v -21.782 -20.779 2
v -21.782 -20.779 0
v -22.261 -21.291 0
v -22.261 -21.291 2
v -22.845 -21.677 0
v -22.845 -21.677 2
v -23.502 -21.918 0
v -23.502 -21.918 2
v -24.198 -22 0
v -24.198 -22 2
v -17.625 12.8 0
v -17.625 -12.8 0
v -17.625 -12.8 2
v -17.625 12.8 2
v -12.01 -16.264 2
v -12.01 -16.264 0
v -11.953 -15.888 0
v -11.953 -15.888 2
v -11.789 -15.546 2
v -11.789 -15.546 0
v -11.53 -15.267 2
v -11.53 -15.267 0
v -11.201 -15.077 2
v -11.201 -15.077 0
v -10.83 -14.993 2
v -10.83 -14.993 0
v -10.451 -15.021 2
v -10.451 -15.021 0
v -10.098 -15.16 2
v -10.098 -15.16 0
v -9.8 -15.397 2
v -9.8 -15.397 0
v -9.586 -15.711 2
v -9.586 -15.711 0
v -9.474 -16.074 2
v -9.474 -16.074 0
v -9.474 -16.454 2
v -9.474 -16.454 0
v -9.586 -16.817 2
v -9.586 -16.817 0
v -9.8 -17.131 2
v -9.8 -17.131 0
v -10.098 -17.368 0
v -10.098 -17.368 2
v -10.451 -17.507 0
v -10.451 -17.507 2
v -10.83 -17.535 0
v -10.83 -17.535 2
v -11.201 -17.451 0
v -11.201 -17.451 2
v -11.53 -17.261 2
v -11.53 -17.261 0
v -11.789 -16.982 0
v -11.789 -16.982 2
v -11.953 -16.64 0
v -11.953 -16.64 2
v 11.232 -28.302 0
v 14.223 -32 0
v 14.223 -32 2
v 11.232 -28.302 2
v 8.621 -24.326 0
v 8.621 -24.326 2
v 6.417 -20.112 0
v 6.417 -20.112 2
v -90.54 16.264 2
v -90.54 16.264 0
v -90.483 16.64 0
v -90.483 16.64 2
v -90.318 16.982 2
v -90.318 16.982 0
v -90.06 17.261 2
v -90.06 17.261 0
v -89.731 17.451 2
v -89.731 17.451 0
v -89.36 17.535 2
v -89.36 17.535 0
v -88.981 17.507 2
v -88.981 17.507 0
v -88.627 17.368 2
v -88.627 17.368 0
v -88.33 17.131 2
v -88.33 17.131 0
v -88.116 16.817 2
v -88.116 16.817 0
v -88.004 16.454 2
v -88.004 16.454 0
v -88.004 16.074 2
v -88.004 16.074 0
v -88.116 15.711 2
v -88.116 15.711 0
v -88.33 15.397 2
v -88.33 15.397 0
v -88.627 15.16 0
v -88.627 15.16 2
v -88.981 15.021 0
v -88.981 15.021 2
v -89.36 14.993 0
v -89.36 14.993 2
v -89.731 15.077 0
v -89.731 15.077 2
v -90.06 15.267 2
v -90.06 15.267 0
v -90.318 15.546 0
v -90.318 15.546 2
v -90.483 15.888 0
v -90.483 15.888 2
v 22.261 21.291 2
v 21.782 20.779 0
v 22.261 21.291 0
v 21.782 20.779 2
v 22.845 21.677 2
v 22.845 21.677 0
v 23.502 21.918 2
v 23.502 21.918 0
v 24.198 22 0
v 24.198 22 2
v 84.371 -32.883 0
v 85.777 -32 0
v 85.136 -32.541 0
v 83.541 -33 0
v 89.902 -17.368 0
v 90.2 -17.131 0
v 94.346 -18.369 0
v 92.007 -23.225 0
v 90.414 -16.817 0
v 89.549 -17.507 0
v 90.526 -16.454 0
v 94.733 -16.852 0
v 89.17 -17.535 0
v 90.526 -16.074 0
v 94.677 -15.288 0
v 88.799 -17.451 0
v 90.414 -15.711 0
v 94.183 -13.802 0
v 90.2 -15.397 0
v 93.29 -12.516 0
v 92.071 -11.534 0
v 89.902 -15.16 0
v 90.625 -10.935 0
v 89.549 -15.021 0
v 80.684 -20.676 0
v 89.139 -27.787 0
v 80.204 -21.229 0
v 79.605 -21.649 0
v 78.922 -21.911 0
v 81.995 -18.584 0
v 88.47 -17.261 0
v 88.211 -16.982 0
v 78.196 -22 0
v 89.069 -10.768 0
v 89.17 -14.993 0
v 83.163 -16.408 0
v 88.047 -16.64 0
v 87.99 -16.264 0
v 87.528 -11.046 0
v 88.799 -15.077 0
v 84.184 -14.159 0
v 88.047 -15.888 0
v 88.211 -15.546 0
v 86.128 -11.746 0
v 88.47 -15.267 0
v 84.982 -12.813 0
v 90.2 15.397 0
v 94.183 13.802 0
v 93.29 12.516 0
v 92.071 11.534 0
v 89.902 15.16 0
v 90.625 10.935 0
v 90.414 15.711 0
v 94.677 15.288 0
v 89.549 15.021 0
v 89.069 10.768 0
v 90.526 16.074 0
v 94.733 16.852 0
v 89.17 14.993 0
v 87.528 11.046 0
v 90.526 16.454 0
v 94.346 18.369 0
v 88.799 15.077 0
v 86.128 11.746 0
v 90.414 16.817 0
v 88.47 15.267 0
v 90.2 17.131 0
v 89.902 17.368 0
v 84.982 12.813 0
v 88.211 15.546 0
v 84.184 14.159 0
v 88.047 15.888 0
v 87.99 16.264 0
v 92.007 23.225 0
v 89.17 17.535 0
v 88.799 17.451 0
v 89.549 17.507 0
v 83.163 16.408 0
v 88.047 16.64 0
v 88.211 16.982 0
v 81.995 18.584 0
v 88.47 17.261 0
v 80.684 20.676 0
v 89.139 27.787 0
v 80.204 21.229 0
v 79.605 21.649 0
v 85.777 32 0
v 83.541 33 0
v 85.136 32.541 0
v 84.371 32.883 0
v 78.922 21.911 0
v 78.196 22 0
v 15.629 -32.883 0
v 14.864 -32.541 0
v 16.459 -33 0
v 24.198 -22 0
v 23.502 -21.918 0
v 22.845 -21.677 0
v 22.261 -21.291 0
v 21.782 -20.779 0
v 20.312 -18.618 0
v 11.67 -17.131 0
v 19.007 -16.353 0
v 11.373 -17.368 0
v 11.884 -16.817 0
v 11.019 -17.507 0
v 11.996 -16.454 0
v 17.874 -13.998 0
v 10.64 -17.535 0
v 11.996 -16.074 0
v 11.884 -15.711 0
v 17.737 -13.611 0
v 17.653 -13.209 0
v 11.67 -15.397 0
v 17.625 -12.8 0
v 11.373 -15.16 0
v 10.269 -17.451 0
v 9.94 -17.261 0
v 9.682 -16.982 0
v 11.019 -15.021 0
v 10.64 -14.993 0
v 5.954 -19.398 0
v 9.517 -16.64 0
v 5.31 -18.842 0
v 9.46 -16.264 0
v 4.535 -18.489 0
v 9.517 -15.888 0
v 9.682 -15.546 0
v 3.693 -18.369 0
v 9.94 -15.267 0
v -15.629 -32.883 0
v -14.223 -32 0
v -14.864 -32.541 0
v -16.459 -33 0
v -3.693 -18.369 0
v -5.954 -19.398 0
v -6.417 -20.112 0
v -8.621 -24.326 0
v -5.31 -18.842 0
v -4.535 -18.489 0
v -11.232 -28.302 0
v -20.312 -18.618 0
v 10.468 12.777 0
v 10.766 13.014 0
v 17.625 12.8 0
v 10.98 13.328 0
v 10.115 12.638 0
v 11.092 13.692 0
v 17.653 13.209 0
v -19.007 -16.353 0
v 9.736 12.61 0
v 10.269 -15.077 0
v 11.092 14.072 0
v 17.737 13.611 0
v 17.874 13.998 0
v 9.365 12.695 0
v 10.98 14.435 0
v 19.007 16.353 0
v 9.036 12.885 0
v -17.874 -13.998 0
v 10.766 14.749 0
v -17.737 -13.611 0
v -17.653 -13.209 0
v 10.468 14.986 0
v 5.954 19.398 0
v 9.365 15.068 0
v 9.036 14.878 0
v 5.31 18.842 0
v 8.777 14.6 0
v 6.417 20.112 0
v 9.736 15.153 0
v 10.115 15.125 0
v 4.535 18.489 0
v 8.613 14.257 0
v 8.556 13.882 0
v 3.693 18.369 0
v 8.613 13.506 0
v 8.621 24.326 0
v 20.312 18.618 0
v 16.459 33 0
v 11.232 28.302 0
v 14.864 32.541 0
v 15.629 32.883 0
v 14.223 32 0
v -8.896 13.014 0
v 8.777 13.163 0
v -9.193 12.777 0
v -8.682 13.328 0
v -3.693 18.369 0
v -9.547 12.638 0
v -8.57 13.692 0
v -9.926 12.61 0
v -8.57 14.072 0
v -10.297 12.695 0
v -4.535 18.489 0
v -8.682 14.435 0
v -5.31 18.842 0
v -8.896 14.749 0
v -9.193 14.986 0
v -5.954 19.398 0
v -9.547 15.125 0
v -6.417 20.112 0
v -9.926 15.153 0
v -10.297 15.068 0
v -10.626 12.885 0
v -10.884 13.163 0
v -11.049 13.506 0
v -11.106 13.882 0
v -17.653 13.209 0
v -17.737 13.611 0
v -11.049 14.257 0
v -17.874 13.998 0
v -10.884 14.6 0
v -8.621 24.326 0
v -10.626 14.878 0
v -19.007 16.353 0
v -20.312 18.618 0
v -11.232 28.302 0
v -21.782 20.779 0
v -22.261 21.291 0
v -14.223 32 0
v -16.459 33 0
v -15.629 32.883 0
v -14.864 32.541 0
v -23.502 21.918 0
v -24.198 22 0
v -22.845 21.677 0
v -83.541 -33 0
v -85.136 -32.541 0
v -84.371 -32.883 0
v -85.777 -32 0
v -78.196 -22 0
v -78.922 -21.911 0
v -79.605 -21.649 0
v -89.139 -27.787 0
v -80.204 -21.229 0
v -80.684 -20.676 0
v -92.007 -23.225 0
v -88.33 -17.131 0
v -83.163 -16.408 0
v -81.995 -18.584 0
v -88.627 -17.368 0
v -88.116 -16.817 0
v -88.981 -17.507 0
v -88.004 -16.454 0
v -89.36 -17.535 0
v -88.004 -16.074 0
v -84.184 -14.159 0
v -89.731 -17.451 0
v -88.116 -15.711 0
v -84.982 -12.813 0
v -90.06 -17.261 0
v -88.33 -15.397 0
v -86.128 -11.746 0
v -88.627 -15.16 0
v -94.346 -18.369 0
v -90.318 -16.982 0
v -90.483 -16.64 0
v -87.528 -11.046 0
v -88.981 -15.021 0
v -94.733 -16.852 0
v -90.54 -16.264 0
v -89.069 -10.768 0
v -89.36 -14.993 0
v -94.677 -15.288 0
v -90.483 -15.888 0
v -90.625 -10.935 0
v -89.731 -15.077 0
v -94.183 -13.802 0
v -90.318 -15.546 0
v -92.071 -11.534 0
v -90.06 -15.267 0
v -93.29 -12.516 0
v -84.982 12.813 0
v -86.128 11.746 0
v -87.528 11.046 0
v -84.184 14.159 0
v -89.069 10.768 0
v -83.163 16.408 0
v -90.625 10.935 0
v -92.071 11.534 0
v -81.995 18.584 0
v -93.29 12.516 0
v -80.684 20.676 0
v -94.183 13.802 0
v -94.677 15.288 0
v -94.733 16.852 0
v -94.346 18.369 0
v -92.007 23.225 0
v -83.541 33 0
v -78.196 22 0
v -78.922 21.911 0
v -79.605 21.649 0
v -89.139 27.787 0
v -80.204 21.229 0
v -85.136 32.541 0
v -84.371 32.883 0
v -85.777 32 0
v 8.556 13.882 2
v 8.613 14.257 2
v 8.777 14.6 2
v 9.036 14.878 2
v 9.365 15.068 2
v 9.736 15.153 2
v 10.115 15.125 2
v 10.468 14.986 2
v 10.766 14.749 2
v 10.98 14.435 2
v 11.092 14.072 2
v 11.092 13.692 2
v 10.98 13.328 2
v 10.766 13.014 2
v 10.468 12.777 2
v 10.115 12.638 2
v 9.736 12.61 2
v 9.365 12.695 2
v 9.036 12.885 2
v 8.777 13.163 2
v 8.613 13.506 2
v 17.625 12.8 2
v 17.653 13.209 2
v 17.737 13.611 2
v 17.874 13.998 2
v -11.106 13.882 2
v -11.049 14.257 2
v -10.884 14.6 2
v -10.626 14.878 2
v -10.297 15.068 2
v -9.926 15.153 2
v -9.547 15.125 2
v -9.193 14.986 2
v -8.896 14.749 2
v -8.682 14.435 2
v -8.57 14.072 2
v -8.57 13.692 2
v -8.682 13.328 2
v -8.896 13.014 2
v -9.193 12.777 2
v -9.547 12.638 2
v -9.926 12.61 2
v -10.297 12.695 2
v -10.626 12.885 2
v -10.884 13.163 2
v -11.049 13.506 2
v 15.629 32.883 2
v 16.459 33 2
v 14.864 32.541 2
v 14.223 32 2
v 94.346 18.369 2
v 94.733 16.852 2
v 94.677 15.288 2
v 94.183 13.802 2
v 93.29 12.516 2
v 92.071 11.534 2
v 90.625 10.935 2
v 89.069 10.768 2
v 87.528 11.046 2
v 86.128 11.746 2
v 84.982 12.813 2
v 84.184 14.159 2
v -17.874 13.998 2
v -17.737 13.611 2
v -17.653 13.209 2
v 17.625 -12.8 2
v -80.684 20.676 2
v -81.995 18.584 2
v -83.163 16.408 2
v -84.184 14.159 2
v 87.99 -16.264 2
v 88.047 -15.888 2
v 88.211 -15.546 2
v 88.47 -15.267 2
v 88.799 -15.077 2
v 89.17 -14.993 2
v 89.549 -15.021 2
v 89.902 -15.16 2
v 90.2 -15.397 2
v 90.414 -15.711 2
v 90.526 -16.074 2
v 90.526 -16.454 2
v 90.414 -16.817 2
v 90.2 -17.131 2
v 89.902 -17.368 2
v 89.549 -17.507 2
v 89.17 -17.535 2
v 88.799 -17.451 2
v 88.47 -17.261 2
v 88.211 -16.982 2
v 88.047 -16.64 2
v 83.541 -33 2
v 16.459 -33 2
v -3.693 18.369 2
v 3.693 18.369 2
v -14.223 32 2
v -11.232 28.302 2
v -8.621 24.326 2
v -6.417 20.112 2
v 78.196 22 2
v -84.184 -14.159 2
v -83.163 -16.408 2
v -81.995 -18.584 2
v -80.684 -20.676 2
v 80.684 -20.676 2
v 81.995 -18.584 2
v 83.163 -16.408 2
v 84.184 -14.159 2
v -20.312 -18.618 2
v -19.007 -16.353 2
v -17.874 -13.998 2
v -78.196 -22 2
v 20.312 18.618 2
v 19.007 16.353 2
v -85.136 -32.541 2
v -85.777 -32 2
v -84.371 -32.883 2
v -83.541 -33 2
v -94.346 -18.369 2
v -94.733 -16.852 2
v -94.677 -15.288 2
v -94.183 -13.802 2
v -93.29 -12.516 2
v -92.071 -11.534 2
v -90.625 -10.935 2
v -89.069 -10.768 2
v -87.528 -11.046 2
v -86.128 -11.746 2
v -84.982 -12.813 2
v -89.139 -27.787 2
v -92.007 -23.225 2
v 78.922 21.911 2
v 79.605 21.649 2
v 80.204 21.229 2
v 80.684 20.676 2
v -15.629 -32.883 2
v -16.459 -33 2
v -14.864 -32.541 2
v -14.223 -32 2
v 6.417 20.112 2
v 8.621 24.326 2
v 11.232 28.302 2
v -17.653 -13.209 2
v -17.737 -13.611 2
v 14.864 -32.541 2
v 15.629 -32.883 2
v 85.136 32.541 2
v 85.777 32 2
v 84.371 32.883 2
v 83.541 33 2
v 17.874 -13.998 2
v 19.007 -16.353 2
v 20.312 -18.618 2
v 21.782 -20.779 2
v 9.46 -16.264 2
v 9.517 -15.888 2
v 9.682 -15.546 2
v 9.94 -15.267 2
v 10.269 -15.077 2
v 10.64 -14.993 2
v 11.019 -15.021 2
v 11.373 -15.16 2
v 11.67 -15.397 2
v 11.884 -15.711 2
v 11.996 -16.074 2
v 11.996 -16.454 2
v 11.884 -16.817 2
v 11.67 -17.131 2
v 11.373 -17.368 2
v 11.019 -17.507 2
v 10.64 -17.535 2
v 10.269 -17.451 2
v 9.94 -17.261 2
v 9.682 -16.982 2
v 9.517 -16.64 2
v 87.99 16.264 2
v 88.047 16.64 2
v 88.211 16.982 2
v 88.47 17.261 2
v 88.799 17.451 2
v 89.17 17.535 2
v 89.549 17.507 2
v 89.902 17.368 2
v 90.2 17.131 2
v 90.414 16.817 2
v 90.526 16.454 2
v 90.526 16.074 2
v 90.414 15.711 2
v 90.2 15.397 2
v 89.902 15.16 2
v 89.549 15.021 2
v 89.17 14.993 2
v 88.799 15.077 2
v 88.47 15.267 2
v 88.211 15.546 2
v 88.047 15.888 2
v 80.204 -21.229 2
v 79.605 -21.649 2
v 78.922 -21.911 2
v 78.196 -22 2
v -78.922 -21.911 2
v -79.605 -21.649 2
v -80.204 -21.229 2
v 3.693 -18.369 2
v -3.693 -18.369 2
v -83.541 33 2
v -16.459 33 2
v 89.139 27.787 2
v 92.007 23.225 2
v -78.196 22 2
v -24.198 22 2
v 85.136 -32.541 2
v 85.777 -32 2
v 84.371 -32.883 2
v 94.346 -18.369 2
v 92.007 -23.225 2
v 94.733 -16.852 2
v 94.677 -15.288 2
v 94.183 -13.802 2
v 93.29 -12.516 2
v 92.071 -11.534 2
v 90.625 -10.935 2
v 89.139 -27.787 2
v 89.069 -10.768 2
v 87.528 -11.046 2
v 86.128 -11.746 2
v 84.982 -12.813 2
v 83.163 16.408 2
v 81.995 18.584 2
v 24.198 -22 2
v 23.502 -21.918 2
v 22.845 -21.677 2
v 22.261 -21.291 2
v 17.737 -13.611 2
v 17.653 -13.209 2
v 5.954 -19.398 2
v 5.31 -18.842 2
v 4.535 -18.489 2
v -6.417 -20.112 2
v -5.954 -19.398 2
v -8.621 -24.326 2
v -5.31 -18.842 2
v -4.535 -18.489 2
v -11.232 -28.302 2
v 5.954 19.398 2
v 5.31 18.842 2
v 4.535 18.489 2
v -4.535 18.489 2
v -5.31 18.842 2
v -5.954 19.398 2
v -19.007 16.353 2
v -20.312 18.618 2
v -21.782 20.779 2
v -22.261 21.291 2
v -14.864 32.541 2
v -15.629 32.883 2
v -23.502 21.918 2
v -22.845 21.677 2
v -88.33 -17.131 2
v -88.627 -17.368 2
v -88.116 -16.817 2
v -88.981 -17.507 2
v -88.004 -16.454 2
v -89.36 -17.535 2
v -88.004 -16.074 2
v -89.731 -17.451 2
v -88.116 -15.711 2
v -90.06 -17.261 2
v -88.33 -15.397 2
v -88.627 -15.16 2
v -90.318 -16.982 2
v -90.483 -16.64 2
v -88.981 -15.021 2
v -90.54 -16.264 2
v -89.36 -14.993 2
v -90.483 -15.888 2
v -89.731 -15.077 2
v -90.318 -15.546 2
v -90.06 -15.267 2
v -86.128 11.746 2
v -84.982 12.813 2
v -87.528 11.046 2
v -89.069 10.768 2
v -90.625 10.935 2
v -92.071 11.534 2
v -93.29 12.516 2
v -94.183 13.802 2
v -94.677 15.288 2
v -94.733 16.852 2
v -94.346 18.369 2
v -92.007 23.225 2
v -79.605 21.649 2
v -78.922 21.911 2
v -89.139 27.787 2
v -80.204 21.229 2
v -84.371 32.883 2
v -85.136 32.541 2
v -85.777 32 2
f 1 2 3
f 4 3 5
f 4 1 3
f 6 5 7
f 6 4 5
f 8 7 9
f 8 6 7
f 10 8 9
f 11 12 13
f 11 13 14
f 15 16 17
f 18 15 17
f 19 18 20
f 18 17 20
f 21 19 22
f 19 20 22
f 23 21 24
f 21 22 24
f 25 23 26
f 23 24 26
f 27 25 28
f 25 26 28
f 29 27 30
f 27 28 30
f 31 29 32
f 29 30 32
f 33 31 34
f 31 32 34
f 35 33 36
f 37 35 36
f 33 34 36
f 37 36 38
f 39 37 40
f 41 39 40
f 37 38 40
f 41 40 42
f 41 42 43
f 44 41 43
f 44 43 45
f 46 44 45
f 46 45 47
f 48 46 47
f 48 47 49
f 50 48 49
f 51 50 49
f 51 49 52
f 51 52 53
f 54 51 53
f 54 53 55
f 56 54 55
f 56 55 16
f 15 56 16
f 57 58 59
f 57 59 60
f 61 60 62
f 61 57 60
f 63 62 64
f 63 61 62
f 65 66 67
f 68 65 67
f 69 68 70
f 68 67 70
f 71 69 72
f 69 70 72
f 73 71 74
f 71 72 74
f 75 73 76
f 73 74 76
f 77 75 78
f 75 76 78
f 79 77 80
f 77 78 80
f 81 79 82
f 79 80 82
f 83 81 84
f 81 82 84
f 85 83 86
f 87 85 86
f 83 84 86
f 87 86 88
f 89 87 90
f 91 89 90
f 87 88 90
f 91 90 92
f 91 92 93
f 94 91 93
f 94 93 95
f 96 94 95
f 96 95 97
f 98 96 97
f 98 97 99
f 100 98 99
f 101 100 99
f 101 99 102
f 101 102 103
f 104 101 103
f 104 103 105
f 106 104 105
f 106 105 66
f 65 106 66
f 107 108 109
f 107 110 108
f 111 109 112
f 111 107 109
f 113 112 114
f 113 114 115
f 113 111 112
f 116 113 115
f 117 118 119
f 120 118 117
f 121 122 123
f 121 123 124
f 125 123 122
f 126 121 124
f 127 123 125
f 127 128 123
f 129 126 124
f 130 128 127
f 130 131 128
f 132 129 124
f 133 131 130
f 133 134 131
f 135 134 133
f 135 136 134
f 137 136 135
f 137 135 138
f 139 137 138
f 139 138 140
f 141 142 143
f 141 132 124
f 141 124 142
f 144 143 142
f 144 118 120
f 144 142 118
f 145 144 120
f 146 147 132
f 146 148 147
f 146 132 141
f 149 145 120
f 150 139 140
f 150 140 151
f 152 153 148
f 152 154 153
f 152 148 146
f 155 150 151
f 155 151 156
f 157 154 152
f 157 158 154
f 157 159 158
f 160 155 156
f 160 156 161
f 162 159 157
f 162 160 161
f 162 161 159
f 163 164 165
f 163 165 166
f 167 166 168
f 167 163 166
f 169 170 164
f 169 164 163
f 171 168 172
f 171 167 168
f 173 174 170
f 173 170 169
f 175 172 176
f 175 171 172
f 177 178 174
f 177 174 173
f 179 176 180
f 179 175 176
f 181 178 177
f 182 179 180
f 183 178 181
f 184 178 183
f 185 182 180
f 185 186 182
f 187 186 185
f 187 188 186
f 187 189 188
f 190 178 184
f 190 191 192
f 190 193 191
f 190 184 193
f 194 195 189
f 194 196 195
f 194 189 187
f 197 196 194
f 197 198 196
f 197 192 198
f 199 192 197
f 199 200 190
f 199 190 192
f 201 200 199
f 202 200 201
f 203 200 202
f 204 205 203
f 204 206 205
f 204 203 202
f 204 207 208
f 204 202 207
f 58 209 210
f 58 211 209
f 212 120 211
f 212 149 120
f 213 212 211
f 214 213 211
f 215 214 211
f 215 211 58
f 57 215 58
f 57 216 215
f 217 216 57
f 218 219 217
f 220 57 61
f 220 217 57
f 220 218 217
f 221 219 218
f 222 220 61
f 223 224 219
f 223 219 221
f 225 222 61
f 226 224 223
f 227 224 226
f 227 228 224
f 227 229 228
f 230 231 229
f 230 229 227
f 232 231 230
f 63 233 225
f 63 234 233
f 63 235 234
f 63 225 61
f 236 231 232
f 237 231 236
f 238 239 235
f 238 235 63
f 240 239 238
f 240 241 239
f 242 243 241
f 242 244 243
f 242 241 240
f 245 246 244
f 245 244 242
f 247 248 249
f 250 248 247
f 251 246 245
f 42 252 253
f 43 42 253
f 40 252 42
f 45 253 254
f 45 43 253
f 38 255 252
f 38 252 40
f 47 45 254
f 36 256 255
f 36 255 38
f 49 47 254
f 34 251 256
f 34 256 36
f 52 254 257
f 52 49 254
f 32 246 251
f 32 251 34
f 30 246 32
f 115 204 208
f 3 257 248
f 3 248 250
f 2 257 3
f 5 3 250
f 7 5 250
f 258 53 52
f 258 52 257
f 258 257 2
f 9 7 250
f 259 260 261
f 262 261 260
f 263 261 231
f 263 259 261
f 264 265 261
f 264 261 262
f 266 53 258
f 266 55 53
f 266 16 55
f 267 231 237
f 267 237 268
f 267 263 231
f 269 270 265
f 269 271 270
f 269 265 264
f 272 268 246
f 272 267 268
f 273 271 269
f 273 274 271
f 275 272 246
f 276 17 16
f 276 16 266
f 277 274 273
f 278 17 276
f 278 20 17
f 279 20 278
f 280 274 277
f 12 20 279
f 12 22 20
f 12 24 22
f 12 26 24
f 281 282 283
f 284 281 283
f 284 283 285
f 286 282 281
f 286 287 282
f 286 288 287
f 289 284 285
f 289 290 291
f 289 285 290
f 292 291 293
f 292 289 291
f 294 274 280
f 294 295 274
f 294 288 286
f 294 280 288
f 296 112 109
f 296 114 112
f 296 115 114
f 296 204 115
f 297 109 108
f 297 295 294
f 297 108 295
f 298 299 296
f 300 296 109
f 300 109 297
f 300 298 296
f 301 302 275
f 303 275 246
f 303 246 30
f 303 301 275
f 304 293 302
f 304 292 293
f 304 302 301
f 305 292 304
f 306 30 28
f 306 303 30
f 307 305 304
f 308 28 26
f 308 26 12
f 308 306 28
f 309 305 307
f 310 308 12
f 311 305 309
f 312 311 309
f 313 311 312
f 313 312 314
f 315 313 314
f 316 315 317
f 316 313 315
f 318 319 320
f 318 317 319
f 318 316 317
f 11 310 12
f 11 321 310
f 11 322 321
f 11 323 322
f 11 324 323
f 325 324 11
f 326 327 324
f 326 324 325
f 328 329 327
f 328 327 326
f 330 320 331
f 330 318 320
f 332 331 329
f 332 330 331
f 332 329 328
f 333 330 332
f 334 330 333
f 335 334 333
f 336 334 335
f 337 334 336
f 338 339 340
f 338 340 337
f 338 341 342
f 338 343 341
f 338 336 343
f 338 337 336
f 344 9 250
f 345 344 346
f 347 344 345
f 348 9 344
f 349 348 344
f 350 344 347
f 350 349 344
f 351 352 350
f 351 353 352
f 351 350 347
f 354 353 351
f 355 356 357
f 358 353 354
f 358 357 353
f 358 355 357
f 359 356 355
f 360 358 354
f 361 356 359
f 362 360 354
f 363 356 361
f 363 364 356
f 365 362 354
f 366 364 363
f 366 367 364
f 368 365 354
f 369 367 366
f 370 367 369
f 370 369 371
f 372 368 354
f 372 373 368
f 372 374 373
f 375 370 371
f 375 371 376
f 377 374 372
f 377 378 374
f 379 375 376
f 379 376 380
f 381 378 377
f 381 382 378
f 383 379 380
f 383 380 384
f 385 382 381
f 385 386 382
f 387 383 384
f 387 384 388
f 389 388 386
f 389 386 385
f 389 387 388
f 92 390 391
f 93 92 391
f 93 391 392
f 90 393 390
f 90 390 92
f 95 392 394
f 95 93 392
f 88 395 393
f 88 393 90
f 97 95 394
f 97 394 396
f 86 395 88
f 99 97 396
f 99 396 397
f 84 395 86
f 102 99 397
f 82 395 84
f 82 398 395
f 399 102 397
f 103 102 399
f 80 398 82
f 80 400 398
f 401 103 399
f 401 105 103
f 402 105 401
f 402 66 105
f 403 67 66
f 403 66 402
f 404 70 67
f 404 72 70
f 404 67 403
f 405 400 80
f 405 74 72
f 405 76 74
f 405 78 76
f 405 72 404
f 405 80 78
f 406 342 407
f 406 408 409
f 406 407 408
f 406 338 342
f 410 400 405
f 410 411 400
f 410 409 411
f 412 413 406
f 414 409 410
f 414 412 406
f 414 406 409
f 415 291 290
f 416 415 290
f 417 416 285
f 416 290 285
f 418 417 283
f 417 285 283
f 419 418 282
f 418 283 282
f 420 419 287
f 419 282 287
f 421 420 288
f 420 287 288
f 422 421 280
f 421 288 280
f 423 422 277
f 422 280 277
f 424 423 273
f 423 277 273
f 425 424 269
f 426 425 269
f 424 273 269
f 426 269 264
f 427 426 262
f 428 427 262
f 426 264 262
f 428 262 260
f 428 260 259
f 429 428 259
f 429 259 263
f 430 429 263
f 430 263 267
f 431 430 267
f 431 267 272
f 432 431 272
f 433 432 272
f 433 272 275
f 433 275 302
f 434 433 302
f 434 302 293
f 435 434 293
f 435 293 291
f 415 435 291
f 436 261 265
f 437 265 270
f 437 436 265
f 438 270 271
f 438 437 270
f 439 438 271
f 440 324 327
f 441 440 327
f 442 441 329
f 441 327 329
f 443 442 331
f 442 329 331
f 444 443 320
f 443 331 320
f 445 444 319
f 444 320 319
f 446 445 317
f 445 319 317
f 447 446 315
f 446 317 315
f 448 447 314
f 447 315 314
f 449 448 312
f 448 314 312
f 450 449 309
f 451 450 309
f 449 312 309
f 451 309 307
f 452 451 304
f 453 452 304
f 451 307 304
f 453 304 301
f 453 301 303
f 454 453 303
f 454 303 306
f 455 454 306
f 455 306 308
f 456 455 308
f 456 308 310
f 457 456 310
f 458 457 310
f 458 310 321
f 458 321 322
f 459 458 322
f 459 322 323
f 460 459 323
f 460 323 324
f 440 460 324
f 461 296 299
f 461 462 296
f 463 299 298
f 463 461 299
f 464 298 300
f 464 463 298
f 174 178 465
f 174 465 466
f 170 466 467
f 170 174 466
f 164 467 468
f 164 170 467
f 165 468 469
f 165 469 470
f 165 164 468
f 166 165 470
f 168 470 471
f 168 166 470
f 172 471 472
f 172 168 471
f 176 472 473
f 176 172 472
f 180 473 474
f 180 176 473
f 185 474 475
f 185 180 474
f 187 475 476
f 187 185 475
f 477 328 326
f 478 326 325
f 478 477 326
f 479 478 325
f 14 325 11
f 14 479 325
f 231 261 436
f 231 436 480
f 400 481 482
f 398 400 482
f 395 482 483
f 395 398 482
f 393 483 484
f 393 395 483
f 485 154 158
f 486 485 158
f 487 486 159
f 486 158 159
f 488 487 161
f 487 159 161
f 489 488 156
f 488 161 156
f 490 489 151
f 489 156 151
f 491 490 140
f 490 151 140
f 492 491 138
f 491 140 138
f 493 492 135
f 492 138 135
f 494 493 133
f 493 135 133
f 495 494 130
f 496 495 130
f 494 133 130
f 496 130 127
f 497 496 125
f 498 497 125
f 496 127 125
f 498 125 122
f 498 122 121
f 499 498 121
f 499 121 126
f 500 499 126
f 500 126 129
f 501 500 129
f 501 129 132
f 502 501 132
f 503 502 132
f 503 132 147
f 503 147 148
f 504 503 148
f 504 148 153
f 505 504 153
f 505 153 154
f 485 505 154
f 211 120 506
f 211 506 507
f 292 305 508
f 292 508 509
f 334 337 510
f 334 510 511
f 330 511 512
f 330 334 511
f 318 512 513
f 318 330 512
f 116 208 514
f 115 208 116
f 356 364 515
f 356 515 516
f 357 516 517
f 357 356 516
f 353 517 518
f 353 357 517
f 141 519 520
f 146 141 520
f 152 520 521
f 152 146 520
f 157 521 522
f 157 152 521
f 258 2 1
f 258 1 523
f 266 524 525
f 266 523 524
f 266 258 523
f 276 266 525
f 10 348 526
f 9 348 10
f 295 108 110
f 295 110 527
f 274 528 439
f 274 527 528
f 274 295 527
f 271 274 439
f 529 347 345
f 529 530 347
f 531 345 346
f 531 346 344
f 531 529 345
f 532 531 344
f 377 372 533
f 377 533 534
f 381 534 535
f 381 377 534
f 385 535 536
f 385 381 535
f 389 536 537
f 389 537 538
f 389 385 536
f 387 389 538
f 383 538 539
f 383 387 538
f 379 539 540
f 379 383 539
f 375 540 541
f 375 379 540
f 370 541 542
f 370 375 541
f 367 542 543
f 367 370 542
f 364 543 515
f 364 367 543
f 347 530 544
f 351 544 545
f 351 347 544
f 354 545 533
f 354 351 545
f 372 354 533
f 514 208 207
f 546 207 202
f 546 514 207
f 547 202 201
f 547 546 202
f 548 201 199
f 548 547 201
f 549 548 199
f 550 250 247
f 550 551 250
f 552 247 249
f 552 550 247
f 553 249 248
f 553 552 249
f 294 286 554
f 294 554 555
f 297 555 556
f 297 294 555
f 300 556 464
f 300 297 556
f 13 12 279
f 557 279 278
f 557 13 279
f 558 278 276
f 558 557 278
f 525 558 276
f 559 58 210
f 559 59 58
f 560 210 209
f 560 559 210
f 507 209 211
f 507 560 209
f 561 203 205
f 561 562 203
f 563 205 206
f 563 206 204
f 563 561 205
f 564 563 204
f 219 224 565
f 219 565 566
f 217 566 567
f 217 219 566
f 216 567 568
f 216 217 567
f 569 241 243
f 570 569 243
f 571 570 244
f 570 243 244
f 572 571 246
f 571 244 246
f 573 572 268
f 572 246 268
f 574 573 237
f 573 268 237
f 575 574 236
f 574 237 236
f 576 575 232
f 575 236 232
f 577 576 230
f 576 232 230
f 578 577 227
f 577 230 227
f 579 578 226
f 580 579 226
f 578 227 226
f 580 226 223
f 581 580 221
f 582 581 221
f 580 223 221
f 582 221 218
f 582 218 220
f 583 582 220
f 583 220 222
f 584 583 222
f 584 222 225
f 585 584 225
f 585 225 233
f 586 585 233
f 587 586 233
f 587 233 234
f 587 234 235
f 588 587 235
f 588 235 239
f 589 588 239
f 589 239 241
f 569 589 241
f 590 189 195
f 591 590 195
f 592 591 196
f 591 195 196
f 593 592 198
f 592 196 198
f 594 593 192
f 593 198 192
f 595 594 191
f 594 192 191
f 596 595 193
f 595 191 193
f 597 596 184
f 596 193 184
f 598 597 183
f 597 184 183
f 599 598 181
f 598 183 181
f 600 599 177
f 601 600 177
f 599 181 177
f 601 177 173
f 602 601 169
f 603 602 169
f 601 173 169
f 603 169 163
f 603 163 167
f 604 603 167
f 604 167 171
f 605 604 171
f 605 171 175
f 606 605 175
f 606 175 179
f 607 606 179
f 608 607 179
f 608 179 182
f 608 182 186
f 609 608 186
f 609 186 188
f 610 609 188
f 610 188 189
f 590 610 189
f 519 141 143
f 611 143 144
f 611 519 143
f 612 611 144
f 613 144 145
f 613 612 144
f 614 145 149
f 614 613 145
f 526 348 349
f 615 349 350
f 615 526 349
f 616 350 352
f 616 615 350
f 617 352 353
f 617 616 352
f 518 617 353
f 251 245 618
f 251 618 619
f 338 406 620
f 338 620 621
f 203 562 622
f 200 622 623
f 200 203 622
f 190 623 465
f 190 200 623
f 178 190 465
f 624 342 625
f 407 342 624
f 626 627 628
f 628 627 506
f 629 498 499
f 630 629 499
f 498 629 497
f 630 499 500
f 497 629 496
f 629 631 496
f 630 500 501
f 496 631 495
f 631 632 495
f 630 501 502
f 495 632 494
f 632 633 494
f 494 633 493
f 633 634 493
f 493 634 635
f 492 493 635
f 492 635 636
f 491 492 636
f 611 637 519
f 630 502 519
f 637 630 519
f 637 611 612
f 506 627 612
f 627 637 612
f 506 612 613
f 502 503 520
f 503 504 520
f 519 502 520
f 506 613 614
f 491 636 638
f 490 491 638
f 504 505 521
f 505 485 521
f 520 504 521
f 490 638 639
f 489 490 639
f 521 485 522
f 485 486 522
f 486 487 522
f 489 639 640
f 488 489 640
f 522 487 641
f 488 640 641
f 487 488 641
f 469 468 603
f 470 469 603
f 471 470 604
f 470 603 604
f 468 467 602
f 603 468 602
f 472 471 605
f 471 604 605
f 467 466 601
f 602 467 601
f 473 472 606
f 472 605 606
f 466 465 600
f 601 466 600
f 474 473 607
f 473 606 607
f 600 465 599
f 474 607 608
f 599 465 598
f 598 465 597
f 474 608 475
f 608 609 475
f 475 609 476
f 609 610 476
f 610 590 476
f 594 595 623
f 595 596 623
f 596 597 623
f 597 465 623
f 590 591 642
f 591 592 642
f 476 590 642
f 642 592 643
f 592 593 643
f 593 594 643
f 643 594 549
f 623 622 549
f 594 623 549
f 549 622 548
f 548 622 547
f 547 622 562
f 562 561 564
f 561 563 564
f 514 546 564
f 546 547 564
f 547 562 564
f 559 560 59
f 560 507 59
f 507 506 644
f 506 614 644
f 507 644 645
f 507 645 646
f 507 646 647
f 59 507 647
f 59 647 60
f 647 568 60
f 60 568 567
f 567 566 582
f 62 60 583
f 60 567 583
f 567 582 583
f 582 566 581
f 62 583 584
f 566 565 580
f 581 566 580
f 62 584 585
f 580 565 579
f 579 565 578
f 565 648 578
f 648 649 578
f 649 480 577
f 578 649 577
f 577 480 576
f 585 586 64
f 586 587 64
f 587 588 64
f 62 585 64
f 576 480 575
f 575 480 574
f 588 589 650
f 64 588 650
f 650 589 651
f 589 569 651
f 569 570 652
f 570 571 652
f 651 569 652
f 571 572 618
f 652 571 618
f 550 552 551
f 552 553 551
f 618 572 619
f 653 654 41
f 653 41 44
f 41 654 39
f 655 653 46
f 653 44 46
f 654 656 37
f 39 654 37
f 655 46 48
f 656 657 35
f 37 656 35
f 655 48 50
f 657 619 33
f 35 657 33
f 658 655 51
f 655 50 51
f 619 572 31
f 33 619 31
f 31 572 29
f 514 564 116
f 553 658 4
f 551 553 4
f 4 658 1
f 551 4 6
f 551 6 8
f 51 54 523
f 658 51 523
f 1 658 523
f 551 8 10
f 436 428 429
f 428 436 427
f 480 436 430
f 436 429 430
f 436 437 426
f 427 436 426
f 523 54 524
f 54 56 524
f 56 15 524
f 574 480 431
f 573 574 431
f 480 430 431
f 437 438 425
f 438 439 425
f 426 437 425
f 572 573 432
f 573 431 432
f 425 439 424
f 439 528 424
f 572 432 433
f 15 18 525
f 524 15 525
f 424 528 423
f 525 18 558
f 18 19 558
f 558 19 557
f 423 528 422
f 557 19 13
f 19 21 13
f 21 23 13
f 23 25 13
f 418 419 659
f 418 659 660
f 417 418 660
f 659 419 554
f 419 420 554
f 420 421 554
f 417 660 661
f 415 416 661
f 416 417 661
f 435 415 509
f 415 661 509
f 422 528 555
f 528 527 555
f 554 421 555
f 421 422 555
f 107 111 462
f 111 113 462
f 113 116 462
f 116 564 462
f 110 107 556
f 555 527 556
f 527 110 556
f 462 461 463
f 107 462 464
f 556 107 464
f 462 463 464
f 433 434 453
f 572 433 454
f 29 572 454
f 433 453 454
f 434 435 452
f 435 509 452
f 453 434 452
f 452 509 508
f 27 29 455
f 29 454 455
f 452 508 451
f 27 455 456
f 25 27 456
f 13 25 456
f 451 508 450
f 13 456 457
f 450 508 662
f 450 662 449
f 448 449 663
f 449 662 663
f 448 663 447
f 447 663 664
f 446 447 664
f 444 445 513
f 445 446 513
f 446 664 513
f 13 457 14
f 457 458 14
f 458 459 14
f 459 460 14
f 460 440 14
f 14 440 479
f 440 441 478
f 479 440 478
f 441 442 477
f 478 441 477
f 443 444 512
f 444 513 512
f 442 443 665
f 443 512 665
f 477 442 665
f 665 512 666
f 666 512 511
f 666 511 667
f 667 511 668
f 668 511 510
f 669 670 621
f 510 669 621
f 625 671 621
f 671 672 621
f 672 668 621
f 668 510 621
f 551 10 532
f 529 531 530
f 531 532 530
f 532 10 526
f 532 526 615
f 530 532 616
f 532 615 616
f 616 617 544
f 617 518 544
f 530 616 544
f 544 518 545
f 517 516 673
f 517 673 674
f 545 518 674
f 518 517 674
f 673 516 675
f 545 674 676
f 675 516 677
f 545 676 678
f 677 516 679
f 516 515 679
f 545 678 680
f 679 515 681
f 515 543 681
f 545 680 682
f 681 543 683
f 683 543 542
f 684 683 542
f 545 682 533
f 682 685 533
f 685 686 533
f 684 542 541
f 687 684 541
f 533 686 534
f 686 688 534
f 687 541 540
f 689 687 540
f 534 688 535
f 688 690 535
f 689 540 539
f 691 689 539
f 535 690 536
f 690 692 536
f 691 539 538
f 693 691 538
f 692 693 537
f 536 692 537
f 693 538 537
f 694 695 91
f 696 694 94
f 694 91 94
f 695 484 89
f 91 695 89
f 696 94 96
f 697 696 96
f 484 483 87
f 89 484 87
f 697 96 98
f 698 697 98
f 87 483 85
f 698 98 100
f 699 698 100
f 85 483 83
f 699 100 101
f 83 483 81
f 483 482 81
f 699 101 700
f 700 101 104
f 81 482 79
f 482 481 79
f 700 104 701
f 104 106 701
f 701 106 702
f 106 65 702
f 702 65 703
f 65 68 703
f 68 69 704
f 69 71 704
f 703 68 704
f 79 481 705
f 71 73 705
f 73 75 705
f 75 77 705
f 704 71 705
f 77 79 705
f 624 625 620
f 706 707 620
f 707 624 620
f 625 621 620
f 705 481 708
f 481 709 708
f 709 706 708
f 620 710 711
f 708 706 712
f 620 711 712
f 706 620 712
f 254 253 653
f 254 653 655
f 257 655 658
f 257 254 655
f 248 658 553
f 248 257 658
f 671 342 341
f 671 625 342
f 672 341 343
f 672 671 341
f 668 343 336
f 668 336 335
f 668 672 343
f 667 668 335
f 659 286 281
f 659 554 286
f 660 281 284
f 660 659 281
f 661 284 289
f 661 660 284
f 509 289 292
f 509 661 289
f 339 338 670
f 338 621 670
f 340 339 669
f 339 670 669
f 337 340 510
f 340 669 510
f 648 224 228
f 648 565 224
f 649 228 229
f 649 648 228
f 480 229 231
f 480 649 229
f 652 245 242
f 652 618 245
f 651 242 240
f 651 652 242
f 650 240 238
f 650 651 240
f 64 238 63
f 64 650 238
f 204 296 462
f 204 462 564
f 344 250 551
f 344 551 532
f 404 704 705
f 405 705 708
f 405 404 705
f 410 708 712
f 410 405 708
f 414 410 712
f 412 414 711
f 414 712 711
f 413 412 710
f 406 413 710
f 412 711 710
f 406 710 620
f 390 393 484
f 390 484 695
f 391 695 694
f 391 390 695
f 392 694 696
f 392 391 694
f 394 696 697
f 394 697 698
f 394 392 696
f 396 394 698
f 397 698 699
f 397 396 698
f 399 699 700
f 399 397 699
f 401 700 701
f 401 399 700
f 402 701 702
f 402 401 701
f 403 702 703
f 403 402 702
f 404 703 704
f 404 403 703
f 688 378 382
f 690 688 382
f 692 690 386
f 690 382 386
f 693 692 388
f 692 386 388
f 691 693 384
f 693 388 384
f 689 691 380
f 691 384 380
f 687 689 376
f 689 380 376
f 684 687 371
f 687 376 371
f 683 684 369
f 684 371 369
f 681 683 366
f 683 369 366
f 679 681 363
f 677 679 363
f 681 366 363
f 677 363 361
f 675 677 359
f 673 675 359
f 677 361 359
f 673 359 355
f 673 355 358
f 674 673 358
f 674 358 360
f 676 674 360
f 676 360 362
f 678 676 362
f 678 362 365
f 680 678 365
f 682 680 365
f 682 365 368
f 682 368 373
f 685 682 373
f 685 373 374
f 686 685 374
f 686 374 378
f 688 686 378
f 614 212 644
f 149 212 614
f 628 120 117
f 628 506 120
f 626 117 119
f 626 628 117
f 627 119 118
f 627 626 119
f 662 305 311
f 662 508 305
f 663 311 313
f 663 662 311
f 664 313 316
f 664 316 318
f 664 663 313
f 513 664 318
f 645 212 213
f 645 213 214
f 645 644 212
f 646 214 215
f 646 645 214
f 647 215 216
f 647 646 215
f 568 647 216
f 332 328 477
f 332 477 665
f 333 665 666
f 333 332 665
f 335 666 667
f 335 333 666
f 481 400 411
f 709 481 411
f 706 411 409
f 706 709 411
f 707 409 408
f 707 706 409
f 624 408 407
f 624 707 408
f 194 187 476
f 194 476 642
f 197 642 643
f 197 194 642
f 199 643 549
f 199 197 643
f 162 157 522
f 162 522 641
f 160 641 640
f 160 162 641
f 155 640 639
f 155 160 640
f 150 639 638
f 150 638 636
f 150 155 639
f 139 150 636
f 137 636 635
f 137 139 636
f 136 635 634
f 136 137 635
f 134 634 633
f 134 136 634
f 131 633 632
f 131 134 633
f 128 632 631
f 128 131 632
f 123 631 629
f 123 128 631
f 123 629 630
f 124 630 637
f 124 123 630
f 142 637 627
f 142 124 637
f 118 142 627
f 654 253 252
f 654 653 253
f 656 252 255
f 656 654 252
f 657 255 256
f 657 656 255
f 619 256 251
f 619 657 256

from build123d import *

# Parameters (mm, degrees)
EXTRUDE_1_DEPTH      = 2
HOLE_WIZARD_M2_5_1_D = 2.55
SKETCH_5_OUTSIDE_W   = 241.652
SKETCH_5_OUTSIDE_H   = 141.652
CUT_EXTRUDE_1_DEPTH  = 10
FILLET_1_R           = 3


with BuildPart() as part:
    # 草图1 → 凸台-拉伸1 (new body)
    with BuildSketch(Plane.XY):
        with BuildLine():
            Line((-50, 48), (50, 48))
            ThreePointArc((50, 48), (98, 0), (50, -48))
            Line((50, -48), (-50, -48))
            ThreePointArc((-50, -48), (-98, 0), (-50, 48))
        make_face()
    extrude(amount=EXTRUDE_1_DEPTH)

    # M2.5 螺旋的螺纹孔钻头1 (through all)
    with Locations(Plane(origin=(-89.264880132, 16.264045876, 2), x_dir=(1, 0, 0), z_dir=(0, 0, 1))):
        with Locations((0, 0), (23.000834256, 23.000834256), (55.528926008, 23.000834256), (55.528926008, -55.528926008), (23.000834256, -55.528926008), (0, -32.528091752), (79.433936211, -2.382513767), (78.529760264, -32.528091752), (100, -32.528091752), (99.095824053, -2.382513767), (178.529760264, -32.528091752), (155.528926008, -55.528926008), (123.000834256, -55.528926008), (123.000834256, 23.000834256), (155.528926008, 23.000834256), (178.529760264, 0)):
            Hole(HOLE_WIZARD_M2_5_1_D / 2)

    # 草图5 outside → 切除-拉伸1 (cut)
    with BuildSketch(Plane.XY):
        Rectangle(SKETCH_5_OUTSIDE_W, SKETCH_5_OUTSIDE_H)
        with BuildLine():
            Line((-17.624645737, -13.410310822), (-17.624645737, 13.410310822))
            ThreePointArc((-17.624645737, 13.410310822), (-19.866504602, 17.8877739), (-22.723636606, 22))
            Line((-22.723636606, 22), (-50, 22))
            Line((-50, 22), (-79.748949561, 22))
            ThreePointArc((-79.748949561, 22), (-82.205746178, 18.215101238), (-84.183542703, 14.159286998))
            ThreePointArc((-84.183542703, 14.159286998), (-91.36963901, 11.182708447), (-94.346217561, 18.368804754))
            ThreePointArc((-94.346217561, 18.368804754), (-90.27157125, 26.118969143), (-84.856850116, 33))
            Line((-84.856850116, 33), (-50, 33))
            Line((-50, 33), (-15.143149884, 33))
            ThreePointArc((-15.143149884, 33), (-9.72842875, 26.118969143), (-5.653782439, 18.368804754))
            Line((-5.653782439, 18.368804754), (5.653782439, 18.368804754))
            ThreePointArc((5.653782439, 18.368804754), (9.72842875, 26.118969143), (15.143149884, 33))
            Line((15.143149884, 33), (50, 33))
            Line((50, 33), (84.856850116, 33))
            ThreePointArc((84.856850116, 33), (90.27157125, 26.118969143), (94.346217561, 18.368804754))
            ThreePointArc((94.346217561, 18.368804754), (91.36963901, 11.182708447), (84.183542703, 14.159286998))
            ThreePointArc((84.183542703, 14.159286998), (82.205746178, 18.215101238), (79.748949561, 22))
            Line((79.748949561, 22), (50, 22))
            Line((50, 22), (22.723636606, 22))
            ThreePointArc((22.723636606, 22), (19.866504602, 17.8877739), (17.624645737, 13.410310822))
            Line((17.624645737, 13.410310822), (17.624645737, -13.410310822))
            ThreePointArc((17.624645737, -13.410310822), (19.866504602, -17.8877739), (22.723636606, -22))
            Line((22.723636606, -22), (50, -22))
            Line((50, -22), (79.748949561, -22))
            ThreePointArc((79.748949561, -22), (82.205746178, -18.215101238), (84.183542703, -14.159286998))
            ThreePointArc((84.183542703, -14.159286998), (91.36963901, -11.182708447), (94.346217561, -18.368804754))
            ThreePointArc((94.346217561, -18.368804754), (90.27157125, -26.118969143), (84.856850116, -33))
            Line((84.856850116, -33), (50, -33))
            Line((50, -33), (15.143149884, -33))
            ThreePointArc((15.143149884, -33), (9.72842875, -26.118969143), (5.653782439, -18.368804754))
            Line((5.653782439, -18.368804754), (-5.653782439, -18.368804754))
            ThreePointArc((-5.653782439, -18.368804754), (-9.72842875, -26.118969143), (-15.143149884, -33))
            Line((-15.143149884, -33), (-50, -33))
            Line((-50, -33), (-84.856850116, -33))
            ThreePointArc((-84.856850116, -33), (-90.27157125, -26.118969143), (-94.346217561, -18.368804754))
            ThreePointArc((-94.346217561, -18.368804754), (-91.36963901, -11.182708447), (-84.183542703, -14.159286998))
            ThreePointArc((-84.183542703, -14.159286998), (-82.205746178, -18.215101238), (-79.748949561, -22))
            Line((-79.748949561, -22), (-50, -22))
            Line((-50, -22), (-22.723636606, -22))
            ThreePointArc((-22.723636606, -22), (-19.866504602, -17.8877739), (-17.624645737, -13.410310822))
        make_face(mode=Mode.SUBTRACT)
    extrude(amount=CUT_EXTRUDE_1_DEPTH, mode=Mode.SUBTRACT)

    # 圆角1
    fillet_1_edges = [part.edges().sort_by_distance(p)[0] for p in [
        (5.653782439, 18.368804754, 1),
        (-5.653782439, 18.368804754, 1),
        (-15.143149884, 33, 1),
        (-84.856850116, 33, 1),
        (-79.748949561, 22, 1),
        (-22.723636606, 22, 1),
        (-17.624645737, 13.410310822, 1),
        (-17.624645737, -13.410310822, 1),
        (-22.723636606, -22, 1),
        (-79.748949561, -22, 1),
        (-84.856850116, -33, 1),
        (-15.143149884, -33, 1),
        (-5.653782439, -18.368804754, 1),
        (5.653782439, -18.368804754, 1),
        (15.143149884, -33, 1),
        (84.856850116, -33, 1),
        (79.748949561, -22, 1),
        (22.723636606, -22, 1),
        (17.624645737, -13.410310822, 1),
        (17.624645737, 13.410310822, 1),
        (22.723636606, 22, 1),
        (79.748949561, 22, 1),
        (84.856850116, 33, 1),
        (15.143149884, 33, 1),
    ]]
    fillet(fillet_1_edges, radius=FILLET_1_R)


solid = part.part
